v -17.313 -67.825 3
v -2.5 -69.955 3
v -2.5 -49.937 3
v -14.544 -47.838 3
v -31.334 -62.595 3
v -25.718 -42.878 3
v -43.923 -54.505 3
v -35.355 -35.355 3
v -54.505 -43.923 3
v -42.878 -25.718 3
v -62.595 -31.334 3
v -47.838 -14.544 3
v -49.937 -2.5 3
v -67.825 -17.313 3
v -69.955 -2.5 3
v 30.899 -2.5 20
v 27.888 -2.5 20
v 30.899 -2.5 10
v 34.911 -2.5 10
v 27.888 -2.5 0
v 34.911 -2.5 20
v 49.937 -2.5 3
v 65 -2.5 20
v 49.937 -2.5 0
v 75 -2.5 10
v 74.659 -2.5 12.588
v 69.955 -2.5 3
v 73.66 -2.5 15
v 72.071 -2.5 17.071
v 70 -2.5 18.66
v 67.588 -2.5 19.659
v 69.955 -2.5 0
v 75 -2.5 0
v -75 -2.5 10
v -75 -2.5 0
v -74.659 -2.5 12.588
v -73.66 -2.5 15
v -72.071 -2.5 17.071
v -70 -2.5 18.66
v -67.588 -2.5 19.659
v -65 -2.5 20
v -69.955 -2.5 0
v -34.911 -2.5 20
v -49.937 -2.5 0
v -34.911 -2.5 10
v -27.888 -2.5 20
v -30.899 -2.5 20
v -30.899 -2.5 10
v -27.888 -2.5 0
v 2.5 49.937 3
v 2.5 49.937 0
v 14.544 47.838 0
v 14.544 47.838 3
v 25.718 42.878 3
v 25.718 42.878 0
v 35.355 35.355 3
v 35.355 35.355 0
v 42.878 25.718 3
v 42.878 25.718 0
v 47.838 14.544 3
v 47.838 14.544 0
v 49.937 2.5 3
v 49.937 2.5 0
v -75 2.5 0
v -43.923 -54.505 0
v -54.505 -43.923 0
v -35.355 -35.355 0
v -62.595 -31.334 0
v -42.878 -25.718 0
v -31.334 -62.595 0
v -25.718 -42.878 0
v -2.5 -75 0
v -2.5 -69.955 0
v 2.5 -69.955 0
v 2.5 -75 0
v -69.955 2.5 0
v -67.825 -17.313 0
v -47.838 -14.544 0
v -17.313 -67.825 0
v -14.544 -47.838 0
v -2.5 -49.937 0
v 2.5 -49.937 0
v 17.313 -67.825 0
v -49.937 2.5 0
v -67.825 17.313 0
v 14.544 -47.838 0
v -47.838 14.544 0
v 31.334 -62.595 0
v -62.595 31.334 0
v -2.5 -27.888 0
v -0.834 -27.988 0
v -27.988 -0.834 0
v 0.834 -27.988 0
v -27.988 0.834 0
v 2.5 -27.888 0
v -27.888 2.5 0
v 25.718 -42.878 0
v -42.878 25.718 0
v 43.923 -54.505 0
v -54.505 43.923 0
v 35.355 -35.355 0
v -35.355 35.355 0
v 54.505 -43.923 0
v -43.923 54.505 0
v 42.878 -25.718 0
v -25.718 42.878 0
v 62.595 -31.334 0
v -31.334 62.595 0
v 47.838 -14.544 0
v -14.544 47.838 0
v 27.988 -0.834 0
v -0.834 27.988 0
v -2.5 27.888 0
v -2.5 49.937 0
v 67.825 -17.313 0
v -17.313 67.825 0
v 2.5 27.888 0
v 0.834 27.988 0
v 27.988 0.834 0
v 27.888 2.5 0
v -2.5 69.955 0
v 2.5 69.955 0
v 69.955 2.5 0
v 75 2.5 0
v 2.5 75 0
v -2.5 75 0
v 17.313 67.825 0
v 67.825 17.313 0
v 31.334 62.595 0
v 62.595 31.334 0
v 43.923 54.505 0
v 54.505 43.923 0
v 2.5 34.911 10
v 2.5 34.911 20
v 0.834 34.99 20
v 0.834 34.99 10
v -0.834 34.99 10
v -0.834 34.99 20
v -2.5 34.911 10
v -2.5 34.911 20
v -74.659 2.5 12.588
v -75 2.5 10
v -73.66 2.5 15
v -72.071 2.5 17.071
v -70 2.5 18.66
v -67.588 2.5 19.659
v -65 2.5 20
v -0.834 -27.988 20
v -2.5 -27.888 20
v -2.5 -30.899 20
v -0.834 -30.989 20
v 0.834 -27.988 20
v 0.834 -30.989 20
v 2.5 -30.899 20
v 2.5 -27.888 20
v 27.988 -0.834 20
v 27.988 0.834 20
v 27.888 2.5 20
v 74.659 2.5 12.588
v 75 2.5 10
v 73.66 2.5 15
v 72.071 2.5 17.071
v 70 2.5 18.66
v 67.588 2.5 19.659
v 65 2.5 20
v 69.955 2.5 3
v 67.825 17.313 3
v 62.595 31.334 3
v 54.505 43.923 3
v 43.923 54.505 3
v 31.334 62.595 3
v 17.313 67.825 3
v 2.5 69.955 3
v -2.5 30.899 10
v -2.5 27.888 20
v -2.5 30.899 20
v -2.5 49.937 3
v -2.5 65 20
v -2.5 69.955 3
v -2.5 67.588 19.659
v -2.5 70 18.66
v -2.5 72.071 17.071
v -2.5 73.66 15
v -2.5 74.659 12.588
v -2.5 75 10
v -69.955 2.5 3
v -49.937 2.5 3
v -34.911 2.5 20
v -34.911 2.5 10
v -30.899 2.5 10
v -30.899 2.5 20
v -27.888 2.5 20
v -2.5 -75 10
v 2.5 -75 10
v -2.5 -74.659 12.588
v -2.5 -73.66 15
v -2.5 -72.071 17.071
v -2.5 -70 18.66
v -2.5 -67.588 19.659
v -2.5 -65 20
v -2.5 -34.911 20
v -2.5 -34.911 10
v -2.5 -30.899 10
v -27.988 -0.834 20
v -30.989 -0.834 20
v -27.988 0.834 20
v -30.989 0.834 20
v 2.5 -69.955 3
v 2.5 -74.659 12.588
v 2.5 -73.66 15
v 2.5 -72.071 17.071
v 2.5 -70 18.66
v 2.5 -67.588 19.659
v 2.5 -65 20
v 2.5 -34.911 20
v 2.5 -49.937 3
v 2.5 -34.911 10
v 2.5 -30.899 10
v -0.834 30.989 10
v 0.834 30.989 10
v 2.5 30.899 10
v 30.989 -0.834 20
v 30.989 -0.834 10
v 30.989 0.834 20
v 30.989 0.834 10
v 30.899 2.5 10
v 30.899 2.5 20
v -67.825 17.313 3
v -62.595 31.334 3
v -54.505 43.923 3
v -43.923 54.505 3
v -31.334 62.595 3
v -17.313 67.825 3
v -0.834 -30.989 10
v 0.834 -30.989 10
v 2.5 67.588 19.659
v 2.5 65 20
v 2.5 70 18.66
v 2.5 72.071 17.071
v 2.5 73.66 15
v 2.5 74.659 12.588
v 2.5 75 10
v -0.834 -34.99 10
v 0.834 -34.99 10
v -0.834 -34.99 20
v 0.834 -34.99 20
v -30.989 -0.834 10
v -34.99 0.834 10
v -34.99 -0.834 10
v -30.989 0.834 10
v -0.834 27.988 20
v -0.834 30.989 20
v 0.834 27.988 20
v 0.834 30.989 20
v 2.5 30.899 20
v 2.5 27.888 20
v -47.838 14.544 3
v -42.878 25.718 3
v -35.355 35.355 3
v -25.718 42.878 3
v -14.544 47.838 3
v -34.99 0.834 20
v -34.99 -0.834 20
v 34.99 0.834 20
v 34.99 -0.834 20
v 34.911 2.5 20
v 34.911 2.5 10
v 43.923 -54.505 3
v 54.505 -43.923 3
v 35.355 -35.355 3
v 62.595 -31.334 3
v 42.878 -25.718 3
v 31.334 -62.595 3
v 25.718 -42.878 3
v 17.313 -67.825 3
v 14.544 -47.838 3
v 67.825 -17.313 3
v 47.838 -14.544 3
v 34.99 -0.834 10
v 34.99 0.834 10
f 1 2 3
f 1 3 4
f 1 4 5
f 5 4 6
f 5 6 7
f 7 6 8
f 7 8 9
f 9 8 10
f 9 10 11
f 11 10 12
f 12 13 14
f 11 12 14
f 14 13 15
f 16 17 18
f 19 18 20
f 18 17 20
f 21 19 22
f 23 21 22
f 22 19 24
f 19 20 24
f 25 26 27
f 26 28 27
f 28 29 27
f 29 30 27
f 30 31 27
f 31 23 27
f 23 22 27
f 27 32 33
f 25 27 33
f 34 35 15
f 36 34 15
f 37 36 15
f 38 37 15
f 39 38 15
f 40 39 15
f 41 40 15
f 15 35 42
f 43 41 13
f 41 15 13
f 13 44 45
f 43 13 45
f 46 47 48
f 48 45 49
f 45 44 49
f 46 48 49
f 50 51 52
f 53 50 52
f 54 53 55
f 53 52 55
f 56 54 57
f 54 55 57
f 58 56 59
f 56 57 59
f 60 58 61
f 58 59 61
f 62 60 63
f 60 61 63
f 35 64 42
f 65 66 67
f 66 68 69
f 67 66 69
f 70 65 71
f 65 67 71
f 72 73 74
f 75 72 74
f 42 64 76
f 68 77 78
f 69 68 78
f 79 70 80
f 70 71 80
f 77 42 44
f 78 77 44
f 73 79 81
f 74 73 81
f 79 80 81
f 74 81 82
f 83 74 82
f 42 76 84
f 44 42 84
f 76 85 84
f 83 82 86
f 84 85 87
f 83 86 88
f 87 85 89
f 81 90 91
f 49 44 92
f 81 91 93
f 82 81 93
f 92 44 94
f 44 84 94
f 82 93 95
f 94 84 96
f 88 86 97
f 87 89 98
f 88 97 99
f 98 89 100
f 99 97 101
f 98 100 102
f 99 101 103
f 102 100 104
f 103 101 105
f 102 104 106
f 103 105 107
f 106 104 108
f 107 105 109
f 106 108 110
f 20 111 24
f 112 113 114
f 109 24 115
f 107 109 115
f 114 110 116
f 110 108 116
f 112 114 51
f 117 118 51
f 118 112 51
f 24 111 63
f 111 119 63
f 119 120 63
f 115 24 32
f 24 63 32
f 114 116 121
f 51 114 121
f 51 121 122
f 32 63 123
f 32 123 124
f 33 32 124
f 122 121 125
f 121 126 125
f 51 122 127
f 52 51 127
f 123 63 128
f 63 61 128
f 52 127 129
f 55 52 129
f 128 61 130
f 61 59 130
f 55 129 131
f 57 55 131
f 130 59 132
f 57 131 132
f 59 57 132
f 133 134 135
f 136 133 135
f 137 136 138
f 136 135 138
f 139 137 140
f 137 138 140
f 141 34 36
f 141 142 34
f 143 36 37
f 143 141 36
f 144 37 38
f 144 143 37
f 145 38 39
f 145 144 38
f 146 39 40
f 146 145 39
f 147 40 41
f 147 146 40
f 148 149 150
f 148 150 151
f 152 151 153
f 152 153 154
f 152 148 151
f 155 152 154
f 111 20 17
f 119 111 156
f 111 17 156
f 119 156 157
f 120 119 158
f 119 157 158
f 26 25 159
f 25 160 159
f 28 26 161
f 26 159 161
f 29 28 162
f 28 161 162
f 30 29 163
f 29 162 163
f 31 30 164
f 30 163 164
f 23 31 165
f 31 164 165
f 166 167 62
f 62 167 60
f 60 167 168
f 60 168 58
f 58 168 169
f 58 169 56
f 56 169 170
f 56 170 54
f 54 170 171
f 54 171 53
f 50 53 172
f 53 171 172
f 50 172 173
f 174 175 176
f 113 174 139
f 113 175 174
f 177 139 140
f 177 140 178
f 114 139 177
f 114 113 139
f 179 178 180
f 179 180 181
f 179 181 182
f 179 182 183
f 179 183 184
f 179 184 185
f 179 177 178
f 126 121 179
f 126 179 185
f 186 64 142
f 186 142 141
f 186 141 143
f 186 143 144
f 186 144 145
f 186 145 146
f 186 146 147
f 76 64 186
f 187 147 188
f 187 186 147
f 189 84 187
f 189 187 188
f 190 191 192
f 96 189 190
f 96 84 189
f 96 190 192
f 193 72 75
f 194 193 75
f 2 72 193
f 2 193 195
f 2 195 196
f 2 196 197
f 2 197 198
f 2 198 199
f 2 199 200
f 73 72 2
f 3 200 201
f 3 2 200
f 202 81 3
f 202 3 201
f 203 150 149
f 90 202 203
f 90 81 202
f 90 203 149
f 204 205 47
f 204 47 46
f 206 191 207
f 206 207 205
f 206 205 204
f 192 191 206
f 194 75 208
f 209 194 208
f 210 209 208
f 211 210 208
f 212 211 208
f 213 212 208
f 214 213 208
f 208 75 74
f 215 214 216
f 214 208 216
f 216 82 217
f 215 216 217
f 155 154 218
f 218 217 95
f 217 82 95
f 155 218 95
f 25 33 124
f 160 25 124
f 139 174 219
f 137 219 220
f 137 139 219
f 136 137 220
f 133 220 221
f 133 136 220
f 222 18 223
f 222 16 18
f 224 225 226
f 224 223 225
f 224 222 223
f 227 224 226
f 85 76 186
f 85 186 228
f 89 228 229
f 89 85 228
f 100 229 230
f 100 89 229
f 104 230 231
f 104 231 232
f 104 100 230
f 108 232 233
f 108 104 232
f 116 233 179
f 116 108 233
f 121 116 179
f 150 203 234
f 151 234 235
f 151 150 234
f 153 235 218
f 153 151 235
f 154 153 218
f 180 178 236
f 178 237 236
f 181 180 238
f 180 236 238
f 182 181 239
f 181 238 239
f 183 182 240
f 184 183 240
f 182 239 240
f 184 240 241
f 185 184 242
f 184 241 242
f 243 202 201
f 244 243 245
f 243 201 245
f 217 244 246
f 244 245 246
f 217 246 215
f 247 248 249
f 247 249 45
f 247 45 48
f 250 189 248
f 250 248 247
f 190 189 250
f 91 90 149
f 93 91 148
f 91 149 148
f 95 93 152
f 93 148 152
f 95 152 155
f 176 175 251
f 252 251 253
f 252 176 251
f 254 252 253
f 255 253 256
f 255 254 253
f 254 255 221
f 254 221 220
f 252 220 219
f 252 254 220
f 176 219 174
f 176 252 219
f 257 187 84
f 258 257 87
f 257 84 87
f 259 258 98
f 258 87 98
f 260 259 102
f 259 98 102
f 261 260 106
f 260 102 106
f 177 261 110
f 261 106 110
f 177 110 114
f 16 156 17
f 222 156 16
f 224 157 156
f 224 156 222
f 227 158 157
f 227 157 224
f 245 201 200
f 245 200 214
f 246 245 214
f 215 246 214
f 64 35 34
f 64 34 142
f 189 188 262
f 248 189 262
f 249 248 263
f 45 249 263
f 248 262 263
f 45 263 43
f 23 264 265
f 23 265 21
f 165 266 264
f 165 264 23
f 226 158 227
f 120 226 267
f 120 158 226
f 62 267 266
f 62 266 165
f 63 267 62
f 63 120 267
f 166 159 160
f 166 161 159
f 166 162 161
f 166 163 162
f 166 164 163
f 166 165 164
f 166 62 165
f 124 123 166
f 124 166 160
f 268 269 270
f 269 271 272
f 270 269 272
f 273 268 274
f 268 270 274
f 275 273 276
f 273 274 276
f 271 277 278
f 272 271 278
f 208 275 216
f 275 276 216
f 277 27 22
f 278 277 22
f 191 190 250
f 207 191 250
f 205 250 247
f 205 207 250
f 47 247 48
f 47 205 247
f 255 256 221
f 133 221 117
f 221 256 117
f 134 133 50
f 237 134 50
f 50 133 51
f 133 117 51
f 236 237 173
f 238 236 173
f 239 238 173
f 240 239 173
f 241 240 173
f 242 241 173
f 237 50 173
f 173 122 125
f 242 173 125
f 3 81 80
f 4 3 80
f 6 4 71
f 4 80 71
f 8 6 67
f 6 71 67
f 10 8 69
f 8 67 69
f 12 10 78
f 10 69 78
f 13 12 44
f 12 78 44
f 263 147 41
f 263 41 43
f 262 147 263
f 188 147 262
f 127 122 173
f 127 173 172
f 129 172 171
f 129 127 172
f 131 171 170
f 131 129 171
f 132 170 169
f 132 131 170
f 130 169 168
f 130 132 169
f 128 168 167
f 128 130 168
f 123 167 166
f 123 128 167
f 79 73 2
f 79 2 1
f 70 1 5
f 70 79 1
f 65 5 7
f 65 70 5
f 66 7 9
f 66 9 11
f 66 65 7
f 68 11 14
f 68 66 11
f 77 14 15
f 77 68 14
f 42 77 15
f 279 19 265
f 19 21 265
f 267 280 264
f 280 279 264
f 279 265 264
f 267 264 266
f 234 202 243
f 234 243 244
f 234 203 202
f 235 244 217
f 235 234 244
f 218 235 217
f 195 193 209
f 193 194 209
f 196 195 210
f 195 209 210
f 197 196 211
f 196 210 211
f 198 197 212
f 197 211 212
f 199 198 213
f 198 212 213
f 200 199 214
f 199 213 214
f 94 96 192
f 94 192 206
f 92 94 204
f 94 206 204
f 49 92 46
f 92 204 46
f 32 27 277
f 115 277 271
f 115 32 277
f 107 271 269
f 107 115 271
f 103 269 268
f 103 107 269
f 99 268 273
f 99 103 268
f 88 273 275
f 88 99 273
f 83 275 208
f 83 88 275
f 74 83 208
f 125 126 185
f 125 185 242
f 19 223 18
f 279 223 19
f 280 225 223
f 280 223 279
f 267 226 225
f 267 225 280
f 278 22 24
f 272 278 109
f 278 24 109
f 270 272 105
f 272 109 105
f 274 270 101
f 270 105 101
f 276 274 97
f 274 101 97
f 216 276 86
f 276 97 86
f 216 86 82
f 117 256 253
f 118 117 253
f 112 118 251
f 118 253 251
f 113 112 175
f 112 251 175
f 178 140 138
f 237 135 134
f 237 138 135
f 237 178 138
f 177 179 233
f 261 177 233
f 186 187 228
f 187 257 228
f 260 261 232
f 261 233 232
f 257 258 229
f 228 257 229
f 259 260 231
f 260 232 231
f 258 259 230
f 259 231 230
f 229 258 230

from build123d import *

# Parameters (mm, degrees)
SKETCH1_W           = 72.5
SKETCH1_H           = 5
SKETCH1_W_2         = 5
SKETCH1_H_2         = 72.5
BOSS_EXTRUDE1_DEPTH = 20
SKETCH2_R           = 70
SKETCH2_R_2         = 50
BOSS_EXTRUDE2_DEPTH = 3
SKETCH3_R           = 35
SKETCH3_R_2         = 31
CUT_EXTRUDE1_DEPTH  = 10
SKETCH4_R           = 28
CUT_EXTRUDE2_DEPTH  = 21
FILLET1_R           = 10
FILLET2_R           = 10
FILLET3_R           = 10
FILLET4_R           = 10


with BuildPart() as part:
    # Sketch1 → Boss-Extrude1 (new body)
    with BuildSketch(Plane.XY):
        with Locations((-38.75, 0)):
            Rectangle(SKETCH1_W, SKETCH1_H)
        with Locations((38.75, 0)):
            Rectangle(SKETCH1_W, SKETCH1_H)
        with Locations((0, 38.75)):
            Rectangle(SKETCH1_W_2, SKETCH1_H_2)
        with Locations((0, -38.75)):
            Rectangle(SKETCH1_W_2, SKETCH1_H_2)
        Rectangle(SKETCH1_W_2, SKETCH1_H)
    extrude(amount=BOSS_EXTRUDE1_DEPTH)

    # Sketch2 → Boss-Extrude2 (add)
    with BuildSketch(Plane(origin=(0, 0, 0), x_dir=(-1, 0, 0), z_dir=(0, 0, -1))):
        Circle(SKETCH2_R)
        Circle(SKETCH2_R_2, mode=Mode.SUBTRACT)
    extrude(amount=-BOSS_EXTRUDE2_DEPTH)

    # Sketch3 → Cut-Extrude1 (cut)
    with BuildSketch(Plane.XY.offset(20)):
        Circle(SKETCH3_R)
        Circle(SKETCH3_R_2, mode=Mode.SUBTRACT)
    extrude(amount=-CUT_EXTRUDE1_DEPTH, mode=Mode.SUBTRACT)

    # Sketch4 → Cut-Extrude2 (cut, through all)
    with BuildSketch(Plane.XY.offset(20)):
        Circle(SKETCH4_R)
    extrude(amount=-CUT_EXTRUDE2_DEPTH, mode=Mode.SUBTRACT)

    # Fillet1
    fillet1_edges = [part.edges().sort_by_distance(p)[0] for p in [
        (0, 75, 20),
    ]]
    fillet(fillet1_edges, radius=FILLET1_R)

    # Fillet2
    fillet2_edges = [part.edges().sort_by_distance(p)[0] for p in [
        (75, 0, 20),
    ]]
    fillet(fillet2_edges, radius=FILLET2_R)

    # Fillet3
    fillet3_edges = [part.edges().sort_by_distance(p)[0] for p in [
        (-75, 0, 20),
    ]]
    fillet(fillet3_edges, radius=FILLET3_R)

    # Fillet4
    fillet4_edges = [part.edges().sort_by_distance(p)[0] for p in [
        (0, -75, 20),
    ]]
    fillet(fillet4_edges, radius=FILLET4_R)


solid = part.part
